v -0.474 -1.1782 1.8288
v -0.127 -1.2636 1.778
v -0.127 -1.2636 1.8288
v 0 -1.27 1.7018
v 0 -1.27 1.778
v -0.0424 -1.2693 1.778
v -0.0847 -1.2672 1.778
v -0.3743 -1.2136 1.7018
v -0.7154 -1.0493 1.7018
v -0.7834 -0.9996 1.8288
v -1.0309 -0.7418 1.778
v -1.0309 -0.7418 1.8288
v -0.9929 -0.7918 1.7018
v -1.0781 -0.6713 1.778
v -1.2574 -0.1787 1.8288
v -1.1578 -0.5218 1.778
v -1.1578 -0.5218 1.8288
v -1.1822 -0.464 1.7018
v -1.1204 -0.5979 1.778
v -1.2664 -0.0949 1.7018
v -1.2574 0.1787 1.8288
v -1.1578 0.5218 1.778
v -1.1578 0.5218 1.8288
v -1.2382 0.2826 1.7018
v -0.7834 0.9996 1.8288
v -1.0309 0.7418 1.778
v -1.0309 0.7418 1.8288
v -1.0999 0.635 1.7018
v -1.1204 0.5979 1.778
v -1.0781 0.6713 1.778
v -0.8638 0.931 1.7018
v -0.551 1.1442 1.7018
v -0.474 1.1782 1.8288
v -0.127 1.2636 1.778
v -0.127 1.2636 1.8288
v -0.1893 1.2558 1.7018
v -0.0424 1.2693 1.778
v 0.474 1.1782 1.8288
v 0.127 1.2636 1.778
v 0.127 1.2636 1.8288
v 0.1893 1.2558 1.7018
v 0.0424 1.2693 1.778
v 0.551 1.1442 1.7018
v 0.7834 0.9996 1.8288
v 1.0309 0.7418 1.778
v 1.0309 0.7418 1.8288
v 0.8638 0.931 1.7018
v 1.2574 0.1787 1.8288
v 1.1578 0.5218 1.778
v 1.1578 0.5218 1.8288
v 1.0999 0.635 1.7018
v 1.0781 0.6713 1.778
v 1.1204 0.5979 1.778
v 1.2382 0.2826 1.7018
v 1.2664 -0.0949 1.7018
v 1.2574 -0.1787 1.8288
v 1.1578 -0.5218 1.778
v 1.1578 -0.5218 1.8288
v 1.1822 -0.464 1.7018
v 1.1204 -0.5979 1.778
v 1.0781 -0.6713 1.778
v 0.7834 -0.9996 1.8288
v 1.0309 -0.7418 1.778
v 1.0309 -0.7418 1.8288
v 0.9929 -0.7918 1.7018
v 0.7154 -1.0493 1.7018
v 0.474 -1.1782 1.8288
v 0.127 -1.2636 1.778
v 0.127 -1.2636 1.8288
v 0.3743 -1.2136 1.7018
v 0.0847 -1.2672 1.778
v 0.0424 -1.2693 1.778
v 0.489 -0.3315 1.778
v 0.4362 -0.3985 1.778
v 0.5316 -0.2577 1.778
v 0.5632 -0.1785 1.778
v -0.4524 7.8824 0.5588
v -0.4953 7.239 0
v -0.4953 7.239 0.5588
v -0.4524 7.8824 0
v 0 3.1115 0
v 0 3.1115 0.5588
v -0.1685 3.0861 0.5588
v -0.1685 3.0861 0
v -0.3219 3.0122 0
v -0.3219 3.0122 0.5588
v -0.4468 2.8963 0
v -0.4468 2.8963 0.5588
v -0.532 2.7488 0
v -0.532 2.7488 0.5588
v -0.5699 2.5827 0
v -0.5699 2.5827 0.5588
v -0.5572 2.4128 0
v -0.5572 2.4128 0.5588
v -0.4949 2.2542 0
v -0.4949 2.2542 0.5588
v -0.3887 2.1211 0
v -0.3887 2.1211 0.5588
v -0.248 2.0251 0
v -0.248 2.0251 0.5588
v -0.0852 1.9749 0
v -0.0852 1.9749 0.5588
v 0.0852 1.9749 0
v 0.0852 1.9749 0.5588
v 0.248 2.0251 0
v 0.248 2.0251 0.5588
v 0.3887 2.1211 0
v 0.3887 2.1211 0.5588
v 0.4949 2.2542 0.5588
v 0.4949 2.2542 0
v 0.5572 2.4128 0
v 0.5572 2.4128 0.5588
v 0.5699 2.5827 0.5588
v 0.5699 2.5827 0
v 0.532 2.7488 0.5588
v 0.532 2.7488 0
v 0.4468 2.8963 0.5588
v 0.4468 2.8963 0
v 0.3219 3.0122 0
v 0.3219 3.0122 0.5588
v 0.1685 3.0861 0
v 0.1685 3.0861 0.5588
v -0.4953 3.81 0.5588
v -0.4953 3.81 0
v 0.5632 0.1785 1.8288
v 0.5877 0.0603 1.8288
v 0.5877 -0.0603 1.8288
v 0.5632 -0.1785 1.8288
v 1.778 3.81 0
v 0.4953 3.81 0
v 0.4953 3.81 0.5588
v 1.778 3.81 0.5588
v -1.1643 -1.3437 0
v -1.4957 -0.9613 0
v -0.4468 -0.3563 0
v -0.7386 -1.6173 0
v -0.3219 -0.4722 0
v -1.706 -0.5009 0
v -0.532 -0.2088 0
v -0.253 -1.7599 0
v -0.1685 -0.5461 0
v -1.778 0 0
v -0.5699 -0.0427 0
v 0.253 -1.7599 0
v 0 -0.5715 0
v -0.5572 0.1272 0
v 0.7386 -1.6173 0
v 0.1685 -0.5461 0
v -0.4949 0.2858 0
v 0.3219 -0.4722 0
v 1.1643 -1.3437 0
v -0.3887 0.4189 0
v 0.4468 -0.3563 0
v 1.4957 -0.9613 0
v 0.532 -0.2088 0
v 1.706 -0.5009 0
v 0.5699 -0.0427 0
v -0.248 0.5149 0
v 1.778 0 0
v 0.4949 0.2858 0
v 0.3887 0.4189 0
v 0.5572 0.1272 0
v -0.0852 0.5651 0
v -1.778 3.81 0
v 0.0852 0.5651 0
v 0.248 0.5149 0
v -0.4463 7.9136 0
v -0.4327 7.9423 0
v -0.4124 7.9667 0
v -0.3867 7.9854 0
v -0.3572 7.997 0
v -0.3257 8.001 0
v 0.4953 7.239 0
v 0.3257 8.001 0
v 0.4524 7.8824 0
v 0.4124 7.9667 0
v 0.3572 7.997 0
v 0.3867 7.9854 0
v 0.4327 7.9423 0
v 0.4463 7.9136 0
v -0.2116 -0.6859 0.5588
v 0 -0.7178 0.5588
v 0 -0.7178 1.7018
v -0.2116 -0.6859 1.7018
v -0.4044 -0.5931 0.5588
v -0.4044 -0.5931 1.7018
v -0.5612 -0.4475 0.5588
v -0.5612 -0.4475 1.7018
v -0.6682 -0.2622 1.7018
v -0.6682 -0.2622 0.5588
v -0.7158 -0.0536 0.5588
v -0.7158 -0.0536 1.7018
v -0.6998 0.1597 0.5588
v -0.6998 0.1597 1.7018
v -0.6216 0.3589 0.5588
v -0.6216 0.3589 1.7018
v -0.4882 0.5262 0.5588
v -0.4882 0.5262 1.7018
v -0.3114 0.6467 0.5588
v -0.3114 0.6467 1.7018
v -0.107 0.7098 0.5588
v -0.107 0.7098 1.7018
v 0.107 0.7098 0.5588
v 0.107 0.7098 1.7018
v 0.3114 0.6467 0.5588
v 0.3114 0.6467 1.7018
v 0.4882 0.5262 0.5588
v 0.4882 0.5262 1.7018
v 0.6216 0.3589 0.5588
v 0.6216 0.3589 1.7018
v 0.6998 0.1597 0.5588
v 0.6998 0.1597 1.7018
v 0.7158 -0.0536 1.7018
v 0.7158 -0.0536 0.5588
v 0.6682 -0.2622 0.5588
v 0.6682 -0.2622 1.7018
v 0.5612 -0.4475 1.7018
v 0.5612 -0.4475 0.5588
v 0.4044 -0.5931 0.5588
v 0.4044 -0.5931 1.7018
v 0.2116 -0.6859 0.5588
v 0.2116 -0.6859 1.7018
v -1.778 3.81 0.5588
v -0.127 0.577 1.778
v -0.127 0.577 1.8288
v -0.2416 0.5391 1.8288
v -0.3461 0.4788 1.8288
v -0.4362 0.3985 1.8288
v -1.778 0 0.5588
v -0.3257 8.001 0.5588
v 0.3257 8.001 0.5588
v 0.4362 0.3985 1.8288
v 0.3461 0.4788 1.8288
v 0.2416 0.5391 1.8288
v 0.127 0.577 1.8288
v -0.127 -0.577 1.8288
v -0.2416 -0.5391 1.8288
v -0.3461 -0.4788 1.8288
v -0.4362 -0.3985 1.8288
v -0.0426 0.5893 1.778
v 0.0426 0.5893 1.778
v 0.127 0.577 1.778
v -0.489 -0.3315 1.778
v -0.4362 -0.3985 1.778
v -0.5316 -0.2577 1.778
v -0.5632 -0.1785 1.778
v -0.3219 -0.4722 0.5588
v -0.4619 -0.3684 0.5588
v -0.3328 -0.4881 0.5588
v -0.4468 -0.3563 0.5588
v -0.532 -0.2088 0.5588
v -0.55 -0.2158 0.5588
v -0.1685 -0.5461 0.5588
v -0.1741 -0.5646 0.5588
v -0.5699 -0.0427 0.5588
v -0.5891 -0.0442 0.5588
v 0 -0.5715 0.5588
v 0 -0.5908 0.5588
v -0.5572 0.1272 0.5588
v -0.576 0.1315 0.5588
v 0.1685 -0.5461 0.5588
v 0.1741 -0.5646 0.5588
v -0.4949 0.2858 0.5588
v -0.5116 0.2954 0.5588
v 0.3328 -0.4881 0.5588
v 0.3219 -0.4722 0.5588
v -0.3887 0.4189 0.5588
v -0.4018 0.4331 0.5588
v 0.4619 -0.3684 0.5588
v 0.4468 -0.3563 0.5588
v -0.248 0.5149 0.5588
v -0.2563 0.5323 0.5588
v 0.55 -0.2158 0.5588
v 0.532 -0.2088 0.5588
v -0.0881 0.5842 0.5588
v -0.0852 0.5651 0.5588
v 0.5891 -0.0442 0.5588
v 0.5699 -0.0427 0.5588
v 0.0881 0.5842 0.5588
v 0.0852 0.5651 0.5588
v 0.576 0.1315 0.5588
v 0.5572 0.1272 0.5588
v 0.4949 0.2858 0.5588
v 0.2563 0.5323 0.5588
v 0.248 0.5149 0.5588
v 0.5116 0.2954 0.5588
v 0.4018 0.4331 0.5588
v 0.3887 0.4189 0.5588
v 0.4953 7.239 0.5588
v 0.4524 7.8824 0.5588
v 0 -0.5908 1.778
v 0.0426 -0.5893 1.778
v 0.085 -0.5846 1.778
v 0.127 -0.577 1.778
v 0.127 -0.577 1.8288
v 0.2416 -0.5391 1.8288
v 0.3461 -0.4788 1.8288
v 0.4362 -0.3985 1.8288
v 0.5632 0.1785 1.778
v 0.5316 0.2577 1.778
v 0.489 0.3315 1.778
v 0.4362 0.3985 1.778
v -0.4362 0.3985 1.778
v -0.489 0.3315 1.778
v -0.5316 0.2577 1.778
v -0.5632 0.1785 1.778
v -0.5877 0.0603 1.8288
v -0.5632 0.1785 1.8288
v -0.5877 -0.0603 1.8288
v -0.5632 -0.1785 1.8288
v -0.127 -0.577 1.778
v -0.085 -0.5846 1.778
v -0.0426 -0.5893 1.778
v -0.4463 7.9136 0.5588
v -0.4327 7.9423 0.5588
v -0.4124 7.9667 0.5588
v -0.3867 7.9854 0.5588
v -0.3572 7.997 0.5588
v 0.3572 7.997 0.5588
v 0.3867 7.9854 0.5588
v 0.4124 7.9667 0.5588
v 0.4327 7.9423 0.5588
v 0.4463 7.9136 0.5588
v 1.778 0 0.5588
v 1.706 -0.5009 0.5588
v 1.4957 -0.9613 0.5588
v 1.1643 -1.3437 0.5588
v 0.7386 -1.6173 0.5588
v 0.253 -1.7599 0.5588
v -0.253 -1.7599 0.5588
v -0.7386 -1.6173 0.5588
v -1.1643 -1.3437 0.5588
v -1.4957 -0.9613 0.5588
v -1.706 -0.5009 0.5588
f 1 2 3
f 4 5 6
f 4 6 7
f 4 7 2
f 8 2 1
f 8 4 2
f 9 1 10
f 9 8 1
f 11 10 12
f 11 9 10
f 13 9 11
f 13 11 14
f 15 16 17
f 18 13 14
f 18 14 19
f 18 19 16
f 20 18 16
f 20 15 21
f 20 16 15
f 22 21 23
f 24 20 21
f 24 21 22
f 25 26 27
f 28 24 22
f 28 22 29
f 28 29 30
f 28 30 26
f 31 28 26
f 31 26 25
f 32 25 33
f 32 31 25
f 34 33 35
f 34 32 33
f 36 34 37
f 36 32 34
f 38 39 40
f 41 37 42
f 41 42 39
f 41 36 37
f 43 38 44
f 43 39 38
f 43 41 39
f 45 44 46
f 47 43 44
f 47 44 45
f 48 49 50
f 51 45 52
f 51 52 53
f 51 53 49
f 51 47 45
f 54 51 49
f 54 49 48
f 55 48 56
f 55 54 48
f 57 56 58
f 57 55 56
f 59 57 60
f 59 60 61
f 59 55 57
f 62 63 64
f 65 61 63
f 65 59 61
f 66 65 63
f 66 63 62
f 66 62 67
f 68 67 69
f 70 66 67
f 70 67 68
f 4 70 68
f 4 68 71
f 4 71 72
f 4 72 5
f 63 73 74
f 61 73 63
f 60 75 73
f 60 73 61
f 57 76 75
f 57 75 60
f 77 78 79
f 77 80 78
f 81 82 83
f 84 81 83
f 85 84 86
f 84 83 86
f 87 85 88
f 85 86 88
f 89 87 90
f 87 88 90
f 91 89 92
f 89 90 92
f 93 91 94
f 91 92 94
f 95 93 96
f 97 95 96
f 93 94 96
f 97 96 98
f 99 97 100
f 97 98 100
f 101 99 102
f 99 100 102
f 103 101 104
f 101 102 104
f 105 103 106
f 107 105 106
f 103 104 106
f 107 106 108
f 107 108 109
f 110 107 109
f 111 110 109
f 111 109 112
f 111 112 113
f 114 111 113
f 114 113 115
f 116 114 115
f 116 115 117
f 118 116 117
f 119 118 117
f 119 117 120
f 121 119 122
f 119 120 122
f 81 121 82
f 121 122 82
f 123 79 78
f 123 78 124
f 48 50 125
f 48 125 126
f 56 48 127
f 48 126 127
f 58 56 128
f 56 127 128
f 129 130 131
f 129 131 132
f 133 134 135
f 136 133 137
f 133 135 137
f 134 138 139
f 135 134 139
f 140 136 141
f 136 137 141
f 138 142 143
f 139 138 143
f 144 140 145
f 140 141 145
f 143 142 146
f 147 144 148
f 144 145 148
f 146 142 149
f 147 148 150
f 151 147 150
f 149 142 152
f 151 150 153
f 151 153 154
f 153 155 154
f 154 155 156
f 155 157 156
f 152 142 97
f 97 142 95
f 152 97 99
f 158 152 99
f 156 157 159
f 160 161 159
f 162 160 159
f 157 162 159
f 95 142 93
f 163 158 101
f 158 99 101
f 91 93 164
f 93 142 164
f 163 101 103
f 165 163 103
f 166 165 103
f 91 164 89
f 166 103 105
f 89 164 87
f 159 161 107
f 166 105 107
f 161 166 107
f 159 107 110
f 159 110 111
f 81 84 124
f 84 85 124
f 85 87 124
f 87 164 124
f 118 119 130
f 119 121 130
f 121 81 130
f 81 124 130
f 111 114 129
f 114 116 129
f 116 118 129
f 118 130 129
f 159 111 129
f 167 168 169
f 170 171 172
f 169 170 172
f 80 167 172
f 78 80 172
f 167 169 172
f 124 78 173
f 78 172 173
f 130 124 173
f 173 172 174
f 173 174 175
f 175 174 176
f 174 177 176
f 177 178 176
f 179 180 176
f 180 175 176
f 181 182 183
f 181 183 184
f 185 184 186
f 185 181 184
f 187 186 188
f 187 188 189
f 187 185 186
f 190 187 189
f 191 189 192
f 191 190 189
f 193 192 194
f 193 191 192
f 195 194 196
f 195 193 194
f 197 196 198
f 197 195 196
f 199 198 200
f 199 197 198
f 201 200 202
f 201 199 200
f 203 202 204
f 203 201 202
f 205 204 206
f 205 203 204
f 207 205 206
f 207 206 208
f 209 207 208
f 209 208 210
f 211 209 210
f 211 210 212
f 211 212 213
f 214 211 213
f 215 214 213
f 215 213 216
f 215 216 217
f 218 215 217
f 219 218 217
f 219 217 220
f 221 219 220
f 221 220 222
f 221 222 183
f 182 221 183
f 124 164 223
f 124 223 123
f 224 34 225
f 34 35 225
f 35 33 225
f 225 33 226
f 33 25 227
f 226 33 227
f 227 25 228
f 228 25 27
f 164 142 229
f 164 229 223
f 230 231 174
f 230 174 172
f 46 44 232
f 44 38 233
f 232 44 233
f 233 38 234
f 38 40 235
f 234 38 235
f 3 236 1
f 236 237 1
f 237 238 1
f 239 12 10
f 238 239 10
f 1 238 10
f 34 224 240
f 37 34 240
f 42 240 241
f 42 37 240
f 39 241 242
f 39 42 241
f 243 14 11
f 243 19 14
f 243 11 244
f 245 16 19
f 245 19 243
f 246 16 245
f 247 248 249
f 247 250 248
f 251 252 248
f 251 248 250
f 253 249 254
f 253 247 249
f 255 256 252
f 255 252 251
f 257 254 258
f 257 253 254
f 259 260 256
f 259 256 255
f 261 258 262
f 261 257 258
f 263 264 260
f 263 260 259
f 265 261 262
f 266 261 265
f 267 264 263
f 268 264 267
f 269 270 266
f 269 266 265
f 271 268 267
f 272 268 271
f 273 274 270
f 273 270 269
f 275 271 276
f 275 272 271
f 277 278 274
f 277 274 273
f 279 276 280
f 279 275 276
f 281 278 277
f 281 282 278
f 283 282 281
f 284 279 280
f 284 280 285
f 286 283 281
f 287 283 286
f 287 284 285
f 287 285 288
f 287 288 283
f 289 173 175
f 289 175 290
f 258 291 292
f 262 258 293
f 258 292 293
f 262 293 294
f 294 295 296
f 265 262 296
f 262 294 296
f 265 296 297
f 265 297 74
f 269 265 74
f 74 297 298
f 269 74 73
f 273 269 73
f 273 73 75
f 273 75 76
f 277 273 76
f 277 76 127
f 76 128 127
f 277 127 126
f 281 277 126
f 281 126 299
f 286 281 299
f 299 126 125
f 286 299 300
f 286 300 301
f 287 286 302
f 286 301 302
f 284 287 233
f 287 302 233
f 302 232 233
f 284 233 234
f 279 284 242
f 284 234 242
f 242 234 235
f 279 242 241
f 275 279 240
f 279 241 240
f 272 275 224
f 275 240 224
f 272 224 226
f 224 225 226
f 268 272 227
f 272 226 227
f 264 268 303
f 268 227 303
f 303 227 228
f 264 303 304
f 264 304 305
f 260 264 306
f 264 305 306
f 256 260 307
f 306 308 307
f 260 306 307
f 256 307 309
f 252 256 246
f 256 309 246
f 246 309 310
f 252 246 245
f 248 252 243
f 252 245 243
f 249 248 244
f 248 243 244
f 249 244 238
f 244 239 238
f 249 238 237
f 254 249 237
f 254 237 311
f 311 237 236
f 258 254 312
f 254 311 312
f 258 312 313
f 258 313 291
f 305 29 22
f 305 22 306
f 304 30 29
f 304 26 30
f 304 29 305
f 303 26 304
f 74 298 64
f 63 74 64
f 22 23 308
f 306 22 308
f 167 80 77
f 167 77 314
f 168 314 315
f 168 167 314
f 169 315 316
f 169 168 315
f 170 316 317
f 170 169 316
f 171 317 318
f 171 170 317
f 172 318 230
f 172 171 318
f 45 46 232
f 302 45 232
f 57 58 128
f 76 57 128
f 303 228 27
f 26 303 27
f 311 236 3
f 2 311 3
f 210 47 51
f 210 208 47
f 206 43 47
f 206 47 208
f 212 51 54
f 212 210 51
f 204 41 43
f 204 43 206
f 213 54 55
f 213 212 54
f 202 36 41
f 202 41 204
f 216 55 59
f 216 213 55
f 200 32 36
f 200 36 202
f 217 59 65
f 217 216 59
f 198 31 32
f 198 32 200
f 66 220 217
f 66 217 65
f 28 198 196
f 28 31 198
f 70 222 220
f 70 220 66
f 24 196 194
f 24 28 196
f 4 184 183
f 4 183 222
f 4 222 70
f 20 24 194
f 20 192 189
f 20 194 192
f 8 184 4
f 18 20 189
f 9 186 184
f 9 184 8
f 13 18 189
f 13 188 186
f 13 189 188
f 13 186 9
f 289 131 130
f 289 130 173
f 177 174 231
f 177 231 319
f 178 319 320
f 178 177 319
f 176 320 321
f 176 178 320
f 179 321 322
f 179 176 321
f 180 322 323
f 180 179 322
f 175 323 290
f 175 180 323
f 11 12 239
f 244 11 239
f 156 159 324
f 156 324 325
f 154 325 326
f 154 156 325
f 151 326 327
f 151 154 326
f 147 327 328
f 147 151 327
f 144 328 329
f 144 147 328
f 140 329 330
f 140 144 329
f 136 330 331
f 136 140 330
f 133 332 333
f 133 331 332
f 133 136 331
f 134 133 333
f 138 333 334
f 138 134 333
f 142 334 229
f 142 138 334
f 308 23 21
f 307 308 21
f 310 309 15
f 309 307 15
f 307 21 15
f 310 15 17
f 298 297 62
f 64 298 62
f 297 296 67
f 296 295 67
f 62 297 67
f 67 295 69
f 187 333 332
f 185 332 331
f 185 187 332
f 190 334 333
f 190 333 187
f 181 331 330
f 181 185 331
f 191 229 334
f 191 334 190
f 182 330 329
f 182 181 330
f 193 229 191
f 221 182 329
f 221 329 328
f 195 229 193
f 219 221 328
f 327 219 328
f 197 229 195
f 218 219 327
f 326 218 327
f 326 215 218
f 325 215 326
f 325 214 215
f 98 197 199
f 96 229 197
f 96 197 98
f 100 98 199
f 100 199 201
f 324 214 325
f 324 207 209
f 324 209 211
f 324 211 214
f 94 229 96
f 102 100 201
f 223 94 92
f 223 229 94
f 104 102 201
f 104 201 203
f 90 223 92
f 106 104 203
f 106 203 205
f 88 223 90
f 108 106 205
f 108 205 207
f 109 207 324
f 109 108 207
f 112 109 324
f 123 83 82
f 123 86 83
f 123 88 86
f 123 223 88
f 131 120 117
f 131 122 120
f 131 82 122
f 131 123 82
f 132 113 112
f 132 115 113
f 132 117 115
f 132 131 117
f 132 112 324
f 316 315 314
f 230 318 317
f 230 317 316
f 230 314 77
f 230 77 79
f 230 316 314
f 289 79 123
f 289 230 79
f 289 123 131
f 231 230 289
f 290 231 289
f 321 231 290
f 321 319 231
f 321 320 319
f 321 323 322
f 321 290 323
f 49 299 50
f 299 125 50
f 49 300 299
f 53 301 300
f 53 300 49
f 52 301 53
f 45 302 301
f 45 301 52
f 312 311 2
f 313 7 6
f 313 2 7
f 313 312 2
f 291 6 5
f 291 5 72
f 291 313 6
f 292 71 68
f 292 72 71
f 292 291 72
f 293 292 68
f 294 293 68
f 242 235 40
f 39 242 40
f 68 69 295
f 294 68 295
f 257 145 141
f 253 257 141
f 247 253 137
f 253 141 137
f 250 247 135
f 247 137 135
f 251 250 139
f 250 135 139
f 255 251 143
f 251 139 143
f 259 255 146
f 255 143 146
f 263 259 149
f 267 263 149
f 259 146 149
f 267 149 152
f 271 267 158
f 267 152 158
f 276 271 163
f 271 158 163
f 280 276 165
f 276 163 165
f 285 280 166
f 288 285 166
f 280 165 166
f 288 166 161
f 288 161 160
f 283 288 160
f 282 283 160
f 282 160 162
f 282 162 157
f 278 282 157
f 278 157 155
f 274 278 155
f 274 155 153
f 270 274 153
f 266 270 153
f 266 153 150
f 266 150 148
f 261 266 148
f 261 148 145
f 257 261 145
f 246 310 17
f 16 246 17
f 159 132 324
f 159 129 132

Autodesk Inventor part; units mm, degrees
ref_plane "YZ Plane" through (0, 0, 0) normal (1, 0, 0) x (0, 1, 0)
ref_plane "XZ Plane" through (0, 0, 0) normal (0, 1, 0) x (-1, 0, 0)
ref_plane "XY Plane" through (0, 0, 0) normal (0, 0, 1) x (1, 0, 0)
sketch "Sketch1" plane through (0, 0, 0) normal (0, 0, 1) x (1, 0, 0)
  arc A0 (-1.778, 0) -> (1.778, 0) centre (0, 0) ccw
  line L0 (-1.778, 0) -> (-1.778, 3.81)
  line L1 (-1.778, 3.81) -> (1.778, 3.81)
  line L2 (1.778, 3.81) -> (1.778, 0)
  dimension "d0" = 3.556
  dimension "d1" = 3.81
extrude "Extrusion1" add sketch "Sketch1" along normal blind 0.5588
hole "Hole1" at (0, 0, 0.5588) direction (0, 0, -1) diameter 1.143 end through all
sketch "Sketch3" plane through (0, 0, 0) normal (1, 0, 0) x (0, 1, 0)
  line L0 (-0.5908, 1.8288) -> (-1.27, 1.8288)
  line L1 (-1.27, 1.8288) -> (-1.27, 1.7018)
  line L2 (0, 0.5588) -> (-1.778, 0.5588) projected
  line L3 (0, 1.8288) -> (0, 0.5588)
  line L4 (-0.5908, 0.5588) -> (-0.5908, 1.8288)
  line L5 (-1.27, 1.7018) -> (-0.7178, 1.7018)
  line L6 (0.5715, 0) -> (-0.5715, 0) projected
  line L7 (-0.5715, 0.5588) -> (0.5715, 0.5588) projected
  line L8 (-0.7178, 1.7018) -> (-0.7178, 0.5588)
  line L9 (-0.7178, 0.5588) -> (-0.5908, 0.5588)
  point P0 (0, 0)
  dimension "d21" = 0.127
  dimension "d22" = 1.27
revolve "Revolution1" add sketch "Sketch3" angle 360 about axis through (0, 0, 1.8288) along (0, 0, -1)
sketch "Sketch4" plane through (0, 0, 1.8288) normal (0, 0, 1) x (1, 0, 0)
  circle A0 centre (0, 0) radius 1.27 projected
  line L0 (-0.127, 0.3054) -> (0.127, 0.3054)
  line L1 (0.127, 0.3054) -> (0.127, 1.3789)
  line L2 (0.127, 1.3789) -> (-0.127, 1.3789)
  line L3 (-0.127, 1.3789) -> (-0.127, 0.3054)
  line L4 (-0.328, 0.0427) -> (-0.201, 0.2627)
  line L5 (-0.201, 0.2627) -> (-1.1307, 0.7994)
  line L6 (-1.1307, 0.7994) -> (-1.2577, 0.5795)
  line L7 (-1.2577, 0.5795) -> (-0.328, 0.0427)
  line L8 (-0.201, -0.2627) -> (-0.328, -0.0427)
  line L9 (-0.328, -0.0427) -> (-1.2577, -0.5795)
  line L10 (-1.2577, -0.5795) -> (-1.1307, -0.7994)
  line L11 (-1.1307, -0.7994) -> (-0.201, -0.2627)
  line L12 (0.127, -0.3054) -> (-0.127, -0.3054)
  line L13 (-0.127, -0.3054) -> (-0.127, -1.3789)
  line L14 (-0.127, -1.3789) -> (0.127, -1.3789)
  line L15 (0.127, -1.3789) -> (0.127, -0.3054)
  line L16 (0.328, -0.0427) -> (0.201, -0.2627)
  line L17 (0.201, -0.2627) -> (1.1307, -0.7994)
  line L18 (1.1307, -0.7994) -> (1.2577, -0.5795)
  line L19 (1.2577, -0.5795) -> (0.328, -0.0427)
  line L20 (0.201, 0.2627) -> (0.328, 0.0427)
  line L21 (0.328, 0.0427) -> (1.2577, 0.5795)
  line L22 (1.2577, 0.5795) -> (1.1307, 0.7994)
  line L23 (1.1307, 0.7994) -> (0.201, 0.2627)
  dimension "d24" = 0.254
  dimension "d25" = 0.127
  dimension "d28" = 360
extrude "Extrusion2" cut sketch "Sketch4" against normal blind 0.0508 contours L21 L20 L23 A0 | A0 L23 L22 L21 | L19 L18 L17 A0 | A0 L17 L16 L19 | L1 L0 L3 A0 | A0 L3 L2 L1 | L15 L14 L13 A0 | A0 L13 L12 L15 | L5 L4 L7 A0 | A0 L7 L6 L5 | L11 L10 L9 A0 | A0 L9 L8 L11
sketch "Sketch5" plane through (0, 0, 0.5588) normal (0, 0, 1) x (1, 0, 0)
  arc A0 (-1.778, 0) -> (1.778, 0) centre (0, 0) ccw projected
  line L0 (1.778, 3.81) -> (-1.778, 3.81) projected
  line L1 (-0.4953, 3.81) -> (0.4953, 3.81)
  line L2 (0.4953, 3.81) -> (0.4953, 8.001)
  line L3 (0.4953, 8.001) -> (-0.4953, 8.001)
  line L4 (-0.4953, 8.001) -> (-0.4953, 3.81)
  dimension "d32" = 4.191
  dimension "d33" = 0.9906
  dimension "d34" = 0.4953
extrude "Extrusion3" add sketch "Sketch5" against normal up to surface (0.5588 mm away)
chamfer "Chamfer1" distance 0.0508 distance2 0.762 1 edges at (0.4953, 8.001, 0.2794) measured on face at (0.1651, 8.001, 0.3725)
chamfer "Chamfer2" distance 0.762 distance2 0.0508 1 edges at (-0.4953, 8.001, 0.2794) measured on face at (-0.4953, 6.604, 0.3725)
fillet "Fillet2" radius 0.127 2 edges at (0.4445, 8.001, 0.2794) (-0.4445, 8.001, 0.2794)
sketch "Sketch6" plane through (0, 0, 0) normal (0, 0, -1) x (-1, 0, 0)
  arc A0 (-1.778, 0) -> (1.778, 0) centre (0, 0) ccw projected
  point P0 (0, 2.54)
  dimension "d45" = 2.54
hole "Hole2" at (0, 2.54, 0) direction (0, 0, 1) diameter 1.143 end through all
equation "\"d25\" = 0.5 * d24"
equation "\"d34\" = 0.5 * d33"
properties part number "Potenciometro - Pata"
